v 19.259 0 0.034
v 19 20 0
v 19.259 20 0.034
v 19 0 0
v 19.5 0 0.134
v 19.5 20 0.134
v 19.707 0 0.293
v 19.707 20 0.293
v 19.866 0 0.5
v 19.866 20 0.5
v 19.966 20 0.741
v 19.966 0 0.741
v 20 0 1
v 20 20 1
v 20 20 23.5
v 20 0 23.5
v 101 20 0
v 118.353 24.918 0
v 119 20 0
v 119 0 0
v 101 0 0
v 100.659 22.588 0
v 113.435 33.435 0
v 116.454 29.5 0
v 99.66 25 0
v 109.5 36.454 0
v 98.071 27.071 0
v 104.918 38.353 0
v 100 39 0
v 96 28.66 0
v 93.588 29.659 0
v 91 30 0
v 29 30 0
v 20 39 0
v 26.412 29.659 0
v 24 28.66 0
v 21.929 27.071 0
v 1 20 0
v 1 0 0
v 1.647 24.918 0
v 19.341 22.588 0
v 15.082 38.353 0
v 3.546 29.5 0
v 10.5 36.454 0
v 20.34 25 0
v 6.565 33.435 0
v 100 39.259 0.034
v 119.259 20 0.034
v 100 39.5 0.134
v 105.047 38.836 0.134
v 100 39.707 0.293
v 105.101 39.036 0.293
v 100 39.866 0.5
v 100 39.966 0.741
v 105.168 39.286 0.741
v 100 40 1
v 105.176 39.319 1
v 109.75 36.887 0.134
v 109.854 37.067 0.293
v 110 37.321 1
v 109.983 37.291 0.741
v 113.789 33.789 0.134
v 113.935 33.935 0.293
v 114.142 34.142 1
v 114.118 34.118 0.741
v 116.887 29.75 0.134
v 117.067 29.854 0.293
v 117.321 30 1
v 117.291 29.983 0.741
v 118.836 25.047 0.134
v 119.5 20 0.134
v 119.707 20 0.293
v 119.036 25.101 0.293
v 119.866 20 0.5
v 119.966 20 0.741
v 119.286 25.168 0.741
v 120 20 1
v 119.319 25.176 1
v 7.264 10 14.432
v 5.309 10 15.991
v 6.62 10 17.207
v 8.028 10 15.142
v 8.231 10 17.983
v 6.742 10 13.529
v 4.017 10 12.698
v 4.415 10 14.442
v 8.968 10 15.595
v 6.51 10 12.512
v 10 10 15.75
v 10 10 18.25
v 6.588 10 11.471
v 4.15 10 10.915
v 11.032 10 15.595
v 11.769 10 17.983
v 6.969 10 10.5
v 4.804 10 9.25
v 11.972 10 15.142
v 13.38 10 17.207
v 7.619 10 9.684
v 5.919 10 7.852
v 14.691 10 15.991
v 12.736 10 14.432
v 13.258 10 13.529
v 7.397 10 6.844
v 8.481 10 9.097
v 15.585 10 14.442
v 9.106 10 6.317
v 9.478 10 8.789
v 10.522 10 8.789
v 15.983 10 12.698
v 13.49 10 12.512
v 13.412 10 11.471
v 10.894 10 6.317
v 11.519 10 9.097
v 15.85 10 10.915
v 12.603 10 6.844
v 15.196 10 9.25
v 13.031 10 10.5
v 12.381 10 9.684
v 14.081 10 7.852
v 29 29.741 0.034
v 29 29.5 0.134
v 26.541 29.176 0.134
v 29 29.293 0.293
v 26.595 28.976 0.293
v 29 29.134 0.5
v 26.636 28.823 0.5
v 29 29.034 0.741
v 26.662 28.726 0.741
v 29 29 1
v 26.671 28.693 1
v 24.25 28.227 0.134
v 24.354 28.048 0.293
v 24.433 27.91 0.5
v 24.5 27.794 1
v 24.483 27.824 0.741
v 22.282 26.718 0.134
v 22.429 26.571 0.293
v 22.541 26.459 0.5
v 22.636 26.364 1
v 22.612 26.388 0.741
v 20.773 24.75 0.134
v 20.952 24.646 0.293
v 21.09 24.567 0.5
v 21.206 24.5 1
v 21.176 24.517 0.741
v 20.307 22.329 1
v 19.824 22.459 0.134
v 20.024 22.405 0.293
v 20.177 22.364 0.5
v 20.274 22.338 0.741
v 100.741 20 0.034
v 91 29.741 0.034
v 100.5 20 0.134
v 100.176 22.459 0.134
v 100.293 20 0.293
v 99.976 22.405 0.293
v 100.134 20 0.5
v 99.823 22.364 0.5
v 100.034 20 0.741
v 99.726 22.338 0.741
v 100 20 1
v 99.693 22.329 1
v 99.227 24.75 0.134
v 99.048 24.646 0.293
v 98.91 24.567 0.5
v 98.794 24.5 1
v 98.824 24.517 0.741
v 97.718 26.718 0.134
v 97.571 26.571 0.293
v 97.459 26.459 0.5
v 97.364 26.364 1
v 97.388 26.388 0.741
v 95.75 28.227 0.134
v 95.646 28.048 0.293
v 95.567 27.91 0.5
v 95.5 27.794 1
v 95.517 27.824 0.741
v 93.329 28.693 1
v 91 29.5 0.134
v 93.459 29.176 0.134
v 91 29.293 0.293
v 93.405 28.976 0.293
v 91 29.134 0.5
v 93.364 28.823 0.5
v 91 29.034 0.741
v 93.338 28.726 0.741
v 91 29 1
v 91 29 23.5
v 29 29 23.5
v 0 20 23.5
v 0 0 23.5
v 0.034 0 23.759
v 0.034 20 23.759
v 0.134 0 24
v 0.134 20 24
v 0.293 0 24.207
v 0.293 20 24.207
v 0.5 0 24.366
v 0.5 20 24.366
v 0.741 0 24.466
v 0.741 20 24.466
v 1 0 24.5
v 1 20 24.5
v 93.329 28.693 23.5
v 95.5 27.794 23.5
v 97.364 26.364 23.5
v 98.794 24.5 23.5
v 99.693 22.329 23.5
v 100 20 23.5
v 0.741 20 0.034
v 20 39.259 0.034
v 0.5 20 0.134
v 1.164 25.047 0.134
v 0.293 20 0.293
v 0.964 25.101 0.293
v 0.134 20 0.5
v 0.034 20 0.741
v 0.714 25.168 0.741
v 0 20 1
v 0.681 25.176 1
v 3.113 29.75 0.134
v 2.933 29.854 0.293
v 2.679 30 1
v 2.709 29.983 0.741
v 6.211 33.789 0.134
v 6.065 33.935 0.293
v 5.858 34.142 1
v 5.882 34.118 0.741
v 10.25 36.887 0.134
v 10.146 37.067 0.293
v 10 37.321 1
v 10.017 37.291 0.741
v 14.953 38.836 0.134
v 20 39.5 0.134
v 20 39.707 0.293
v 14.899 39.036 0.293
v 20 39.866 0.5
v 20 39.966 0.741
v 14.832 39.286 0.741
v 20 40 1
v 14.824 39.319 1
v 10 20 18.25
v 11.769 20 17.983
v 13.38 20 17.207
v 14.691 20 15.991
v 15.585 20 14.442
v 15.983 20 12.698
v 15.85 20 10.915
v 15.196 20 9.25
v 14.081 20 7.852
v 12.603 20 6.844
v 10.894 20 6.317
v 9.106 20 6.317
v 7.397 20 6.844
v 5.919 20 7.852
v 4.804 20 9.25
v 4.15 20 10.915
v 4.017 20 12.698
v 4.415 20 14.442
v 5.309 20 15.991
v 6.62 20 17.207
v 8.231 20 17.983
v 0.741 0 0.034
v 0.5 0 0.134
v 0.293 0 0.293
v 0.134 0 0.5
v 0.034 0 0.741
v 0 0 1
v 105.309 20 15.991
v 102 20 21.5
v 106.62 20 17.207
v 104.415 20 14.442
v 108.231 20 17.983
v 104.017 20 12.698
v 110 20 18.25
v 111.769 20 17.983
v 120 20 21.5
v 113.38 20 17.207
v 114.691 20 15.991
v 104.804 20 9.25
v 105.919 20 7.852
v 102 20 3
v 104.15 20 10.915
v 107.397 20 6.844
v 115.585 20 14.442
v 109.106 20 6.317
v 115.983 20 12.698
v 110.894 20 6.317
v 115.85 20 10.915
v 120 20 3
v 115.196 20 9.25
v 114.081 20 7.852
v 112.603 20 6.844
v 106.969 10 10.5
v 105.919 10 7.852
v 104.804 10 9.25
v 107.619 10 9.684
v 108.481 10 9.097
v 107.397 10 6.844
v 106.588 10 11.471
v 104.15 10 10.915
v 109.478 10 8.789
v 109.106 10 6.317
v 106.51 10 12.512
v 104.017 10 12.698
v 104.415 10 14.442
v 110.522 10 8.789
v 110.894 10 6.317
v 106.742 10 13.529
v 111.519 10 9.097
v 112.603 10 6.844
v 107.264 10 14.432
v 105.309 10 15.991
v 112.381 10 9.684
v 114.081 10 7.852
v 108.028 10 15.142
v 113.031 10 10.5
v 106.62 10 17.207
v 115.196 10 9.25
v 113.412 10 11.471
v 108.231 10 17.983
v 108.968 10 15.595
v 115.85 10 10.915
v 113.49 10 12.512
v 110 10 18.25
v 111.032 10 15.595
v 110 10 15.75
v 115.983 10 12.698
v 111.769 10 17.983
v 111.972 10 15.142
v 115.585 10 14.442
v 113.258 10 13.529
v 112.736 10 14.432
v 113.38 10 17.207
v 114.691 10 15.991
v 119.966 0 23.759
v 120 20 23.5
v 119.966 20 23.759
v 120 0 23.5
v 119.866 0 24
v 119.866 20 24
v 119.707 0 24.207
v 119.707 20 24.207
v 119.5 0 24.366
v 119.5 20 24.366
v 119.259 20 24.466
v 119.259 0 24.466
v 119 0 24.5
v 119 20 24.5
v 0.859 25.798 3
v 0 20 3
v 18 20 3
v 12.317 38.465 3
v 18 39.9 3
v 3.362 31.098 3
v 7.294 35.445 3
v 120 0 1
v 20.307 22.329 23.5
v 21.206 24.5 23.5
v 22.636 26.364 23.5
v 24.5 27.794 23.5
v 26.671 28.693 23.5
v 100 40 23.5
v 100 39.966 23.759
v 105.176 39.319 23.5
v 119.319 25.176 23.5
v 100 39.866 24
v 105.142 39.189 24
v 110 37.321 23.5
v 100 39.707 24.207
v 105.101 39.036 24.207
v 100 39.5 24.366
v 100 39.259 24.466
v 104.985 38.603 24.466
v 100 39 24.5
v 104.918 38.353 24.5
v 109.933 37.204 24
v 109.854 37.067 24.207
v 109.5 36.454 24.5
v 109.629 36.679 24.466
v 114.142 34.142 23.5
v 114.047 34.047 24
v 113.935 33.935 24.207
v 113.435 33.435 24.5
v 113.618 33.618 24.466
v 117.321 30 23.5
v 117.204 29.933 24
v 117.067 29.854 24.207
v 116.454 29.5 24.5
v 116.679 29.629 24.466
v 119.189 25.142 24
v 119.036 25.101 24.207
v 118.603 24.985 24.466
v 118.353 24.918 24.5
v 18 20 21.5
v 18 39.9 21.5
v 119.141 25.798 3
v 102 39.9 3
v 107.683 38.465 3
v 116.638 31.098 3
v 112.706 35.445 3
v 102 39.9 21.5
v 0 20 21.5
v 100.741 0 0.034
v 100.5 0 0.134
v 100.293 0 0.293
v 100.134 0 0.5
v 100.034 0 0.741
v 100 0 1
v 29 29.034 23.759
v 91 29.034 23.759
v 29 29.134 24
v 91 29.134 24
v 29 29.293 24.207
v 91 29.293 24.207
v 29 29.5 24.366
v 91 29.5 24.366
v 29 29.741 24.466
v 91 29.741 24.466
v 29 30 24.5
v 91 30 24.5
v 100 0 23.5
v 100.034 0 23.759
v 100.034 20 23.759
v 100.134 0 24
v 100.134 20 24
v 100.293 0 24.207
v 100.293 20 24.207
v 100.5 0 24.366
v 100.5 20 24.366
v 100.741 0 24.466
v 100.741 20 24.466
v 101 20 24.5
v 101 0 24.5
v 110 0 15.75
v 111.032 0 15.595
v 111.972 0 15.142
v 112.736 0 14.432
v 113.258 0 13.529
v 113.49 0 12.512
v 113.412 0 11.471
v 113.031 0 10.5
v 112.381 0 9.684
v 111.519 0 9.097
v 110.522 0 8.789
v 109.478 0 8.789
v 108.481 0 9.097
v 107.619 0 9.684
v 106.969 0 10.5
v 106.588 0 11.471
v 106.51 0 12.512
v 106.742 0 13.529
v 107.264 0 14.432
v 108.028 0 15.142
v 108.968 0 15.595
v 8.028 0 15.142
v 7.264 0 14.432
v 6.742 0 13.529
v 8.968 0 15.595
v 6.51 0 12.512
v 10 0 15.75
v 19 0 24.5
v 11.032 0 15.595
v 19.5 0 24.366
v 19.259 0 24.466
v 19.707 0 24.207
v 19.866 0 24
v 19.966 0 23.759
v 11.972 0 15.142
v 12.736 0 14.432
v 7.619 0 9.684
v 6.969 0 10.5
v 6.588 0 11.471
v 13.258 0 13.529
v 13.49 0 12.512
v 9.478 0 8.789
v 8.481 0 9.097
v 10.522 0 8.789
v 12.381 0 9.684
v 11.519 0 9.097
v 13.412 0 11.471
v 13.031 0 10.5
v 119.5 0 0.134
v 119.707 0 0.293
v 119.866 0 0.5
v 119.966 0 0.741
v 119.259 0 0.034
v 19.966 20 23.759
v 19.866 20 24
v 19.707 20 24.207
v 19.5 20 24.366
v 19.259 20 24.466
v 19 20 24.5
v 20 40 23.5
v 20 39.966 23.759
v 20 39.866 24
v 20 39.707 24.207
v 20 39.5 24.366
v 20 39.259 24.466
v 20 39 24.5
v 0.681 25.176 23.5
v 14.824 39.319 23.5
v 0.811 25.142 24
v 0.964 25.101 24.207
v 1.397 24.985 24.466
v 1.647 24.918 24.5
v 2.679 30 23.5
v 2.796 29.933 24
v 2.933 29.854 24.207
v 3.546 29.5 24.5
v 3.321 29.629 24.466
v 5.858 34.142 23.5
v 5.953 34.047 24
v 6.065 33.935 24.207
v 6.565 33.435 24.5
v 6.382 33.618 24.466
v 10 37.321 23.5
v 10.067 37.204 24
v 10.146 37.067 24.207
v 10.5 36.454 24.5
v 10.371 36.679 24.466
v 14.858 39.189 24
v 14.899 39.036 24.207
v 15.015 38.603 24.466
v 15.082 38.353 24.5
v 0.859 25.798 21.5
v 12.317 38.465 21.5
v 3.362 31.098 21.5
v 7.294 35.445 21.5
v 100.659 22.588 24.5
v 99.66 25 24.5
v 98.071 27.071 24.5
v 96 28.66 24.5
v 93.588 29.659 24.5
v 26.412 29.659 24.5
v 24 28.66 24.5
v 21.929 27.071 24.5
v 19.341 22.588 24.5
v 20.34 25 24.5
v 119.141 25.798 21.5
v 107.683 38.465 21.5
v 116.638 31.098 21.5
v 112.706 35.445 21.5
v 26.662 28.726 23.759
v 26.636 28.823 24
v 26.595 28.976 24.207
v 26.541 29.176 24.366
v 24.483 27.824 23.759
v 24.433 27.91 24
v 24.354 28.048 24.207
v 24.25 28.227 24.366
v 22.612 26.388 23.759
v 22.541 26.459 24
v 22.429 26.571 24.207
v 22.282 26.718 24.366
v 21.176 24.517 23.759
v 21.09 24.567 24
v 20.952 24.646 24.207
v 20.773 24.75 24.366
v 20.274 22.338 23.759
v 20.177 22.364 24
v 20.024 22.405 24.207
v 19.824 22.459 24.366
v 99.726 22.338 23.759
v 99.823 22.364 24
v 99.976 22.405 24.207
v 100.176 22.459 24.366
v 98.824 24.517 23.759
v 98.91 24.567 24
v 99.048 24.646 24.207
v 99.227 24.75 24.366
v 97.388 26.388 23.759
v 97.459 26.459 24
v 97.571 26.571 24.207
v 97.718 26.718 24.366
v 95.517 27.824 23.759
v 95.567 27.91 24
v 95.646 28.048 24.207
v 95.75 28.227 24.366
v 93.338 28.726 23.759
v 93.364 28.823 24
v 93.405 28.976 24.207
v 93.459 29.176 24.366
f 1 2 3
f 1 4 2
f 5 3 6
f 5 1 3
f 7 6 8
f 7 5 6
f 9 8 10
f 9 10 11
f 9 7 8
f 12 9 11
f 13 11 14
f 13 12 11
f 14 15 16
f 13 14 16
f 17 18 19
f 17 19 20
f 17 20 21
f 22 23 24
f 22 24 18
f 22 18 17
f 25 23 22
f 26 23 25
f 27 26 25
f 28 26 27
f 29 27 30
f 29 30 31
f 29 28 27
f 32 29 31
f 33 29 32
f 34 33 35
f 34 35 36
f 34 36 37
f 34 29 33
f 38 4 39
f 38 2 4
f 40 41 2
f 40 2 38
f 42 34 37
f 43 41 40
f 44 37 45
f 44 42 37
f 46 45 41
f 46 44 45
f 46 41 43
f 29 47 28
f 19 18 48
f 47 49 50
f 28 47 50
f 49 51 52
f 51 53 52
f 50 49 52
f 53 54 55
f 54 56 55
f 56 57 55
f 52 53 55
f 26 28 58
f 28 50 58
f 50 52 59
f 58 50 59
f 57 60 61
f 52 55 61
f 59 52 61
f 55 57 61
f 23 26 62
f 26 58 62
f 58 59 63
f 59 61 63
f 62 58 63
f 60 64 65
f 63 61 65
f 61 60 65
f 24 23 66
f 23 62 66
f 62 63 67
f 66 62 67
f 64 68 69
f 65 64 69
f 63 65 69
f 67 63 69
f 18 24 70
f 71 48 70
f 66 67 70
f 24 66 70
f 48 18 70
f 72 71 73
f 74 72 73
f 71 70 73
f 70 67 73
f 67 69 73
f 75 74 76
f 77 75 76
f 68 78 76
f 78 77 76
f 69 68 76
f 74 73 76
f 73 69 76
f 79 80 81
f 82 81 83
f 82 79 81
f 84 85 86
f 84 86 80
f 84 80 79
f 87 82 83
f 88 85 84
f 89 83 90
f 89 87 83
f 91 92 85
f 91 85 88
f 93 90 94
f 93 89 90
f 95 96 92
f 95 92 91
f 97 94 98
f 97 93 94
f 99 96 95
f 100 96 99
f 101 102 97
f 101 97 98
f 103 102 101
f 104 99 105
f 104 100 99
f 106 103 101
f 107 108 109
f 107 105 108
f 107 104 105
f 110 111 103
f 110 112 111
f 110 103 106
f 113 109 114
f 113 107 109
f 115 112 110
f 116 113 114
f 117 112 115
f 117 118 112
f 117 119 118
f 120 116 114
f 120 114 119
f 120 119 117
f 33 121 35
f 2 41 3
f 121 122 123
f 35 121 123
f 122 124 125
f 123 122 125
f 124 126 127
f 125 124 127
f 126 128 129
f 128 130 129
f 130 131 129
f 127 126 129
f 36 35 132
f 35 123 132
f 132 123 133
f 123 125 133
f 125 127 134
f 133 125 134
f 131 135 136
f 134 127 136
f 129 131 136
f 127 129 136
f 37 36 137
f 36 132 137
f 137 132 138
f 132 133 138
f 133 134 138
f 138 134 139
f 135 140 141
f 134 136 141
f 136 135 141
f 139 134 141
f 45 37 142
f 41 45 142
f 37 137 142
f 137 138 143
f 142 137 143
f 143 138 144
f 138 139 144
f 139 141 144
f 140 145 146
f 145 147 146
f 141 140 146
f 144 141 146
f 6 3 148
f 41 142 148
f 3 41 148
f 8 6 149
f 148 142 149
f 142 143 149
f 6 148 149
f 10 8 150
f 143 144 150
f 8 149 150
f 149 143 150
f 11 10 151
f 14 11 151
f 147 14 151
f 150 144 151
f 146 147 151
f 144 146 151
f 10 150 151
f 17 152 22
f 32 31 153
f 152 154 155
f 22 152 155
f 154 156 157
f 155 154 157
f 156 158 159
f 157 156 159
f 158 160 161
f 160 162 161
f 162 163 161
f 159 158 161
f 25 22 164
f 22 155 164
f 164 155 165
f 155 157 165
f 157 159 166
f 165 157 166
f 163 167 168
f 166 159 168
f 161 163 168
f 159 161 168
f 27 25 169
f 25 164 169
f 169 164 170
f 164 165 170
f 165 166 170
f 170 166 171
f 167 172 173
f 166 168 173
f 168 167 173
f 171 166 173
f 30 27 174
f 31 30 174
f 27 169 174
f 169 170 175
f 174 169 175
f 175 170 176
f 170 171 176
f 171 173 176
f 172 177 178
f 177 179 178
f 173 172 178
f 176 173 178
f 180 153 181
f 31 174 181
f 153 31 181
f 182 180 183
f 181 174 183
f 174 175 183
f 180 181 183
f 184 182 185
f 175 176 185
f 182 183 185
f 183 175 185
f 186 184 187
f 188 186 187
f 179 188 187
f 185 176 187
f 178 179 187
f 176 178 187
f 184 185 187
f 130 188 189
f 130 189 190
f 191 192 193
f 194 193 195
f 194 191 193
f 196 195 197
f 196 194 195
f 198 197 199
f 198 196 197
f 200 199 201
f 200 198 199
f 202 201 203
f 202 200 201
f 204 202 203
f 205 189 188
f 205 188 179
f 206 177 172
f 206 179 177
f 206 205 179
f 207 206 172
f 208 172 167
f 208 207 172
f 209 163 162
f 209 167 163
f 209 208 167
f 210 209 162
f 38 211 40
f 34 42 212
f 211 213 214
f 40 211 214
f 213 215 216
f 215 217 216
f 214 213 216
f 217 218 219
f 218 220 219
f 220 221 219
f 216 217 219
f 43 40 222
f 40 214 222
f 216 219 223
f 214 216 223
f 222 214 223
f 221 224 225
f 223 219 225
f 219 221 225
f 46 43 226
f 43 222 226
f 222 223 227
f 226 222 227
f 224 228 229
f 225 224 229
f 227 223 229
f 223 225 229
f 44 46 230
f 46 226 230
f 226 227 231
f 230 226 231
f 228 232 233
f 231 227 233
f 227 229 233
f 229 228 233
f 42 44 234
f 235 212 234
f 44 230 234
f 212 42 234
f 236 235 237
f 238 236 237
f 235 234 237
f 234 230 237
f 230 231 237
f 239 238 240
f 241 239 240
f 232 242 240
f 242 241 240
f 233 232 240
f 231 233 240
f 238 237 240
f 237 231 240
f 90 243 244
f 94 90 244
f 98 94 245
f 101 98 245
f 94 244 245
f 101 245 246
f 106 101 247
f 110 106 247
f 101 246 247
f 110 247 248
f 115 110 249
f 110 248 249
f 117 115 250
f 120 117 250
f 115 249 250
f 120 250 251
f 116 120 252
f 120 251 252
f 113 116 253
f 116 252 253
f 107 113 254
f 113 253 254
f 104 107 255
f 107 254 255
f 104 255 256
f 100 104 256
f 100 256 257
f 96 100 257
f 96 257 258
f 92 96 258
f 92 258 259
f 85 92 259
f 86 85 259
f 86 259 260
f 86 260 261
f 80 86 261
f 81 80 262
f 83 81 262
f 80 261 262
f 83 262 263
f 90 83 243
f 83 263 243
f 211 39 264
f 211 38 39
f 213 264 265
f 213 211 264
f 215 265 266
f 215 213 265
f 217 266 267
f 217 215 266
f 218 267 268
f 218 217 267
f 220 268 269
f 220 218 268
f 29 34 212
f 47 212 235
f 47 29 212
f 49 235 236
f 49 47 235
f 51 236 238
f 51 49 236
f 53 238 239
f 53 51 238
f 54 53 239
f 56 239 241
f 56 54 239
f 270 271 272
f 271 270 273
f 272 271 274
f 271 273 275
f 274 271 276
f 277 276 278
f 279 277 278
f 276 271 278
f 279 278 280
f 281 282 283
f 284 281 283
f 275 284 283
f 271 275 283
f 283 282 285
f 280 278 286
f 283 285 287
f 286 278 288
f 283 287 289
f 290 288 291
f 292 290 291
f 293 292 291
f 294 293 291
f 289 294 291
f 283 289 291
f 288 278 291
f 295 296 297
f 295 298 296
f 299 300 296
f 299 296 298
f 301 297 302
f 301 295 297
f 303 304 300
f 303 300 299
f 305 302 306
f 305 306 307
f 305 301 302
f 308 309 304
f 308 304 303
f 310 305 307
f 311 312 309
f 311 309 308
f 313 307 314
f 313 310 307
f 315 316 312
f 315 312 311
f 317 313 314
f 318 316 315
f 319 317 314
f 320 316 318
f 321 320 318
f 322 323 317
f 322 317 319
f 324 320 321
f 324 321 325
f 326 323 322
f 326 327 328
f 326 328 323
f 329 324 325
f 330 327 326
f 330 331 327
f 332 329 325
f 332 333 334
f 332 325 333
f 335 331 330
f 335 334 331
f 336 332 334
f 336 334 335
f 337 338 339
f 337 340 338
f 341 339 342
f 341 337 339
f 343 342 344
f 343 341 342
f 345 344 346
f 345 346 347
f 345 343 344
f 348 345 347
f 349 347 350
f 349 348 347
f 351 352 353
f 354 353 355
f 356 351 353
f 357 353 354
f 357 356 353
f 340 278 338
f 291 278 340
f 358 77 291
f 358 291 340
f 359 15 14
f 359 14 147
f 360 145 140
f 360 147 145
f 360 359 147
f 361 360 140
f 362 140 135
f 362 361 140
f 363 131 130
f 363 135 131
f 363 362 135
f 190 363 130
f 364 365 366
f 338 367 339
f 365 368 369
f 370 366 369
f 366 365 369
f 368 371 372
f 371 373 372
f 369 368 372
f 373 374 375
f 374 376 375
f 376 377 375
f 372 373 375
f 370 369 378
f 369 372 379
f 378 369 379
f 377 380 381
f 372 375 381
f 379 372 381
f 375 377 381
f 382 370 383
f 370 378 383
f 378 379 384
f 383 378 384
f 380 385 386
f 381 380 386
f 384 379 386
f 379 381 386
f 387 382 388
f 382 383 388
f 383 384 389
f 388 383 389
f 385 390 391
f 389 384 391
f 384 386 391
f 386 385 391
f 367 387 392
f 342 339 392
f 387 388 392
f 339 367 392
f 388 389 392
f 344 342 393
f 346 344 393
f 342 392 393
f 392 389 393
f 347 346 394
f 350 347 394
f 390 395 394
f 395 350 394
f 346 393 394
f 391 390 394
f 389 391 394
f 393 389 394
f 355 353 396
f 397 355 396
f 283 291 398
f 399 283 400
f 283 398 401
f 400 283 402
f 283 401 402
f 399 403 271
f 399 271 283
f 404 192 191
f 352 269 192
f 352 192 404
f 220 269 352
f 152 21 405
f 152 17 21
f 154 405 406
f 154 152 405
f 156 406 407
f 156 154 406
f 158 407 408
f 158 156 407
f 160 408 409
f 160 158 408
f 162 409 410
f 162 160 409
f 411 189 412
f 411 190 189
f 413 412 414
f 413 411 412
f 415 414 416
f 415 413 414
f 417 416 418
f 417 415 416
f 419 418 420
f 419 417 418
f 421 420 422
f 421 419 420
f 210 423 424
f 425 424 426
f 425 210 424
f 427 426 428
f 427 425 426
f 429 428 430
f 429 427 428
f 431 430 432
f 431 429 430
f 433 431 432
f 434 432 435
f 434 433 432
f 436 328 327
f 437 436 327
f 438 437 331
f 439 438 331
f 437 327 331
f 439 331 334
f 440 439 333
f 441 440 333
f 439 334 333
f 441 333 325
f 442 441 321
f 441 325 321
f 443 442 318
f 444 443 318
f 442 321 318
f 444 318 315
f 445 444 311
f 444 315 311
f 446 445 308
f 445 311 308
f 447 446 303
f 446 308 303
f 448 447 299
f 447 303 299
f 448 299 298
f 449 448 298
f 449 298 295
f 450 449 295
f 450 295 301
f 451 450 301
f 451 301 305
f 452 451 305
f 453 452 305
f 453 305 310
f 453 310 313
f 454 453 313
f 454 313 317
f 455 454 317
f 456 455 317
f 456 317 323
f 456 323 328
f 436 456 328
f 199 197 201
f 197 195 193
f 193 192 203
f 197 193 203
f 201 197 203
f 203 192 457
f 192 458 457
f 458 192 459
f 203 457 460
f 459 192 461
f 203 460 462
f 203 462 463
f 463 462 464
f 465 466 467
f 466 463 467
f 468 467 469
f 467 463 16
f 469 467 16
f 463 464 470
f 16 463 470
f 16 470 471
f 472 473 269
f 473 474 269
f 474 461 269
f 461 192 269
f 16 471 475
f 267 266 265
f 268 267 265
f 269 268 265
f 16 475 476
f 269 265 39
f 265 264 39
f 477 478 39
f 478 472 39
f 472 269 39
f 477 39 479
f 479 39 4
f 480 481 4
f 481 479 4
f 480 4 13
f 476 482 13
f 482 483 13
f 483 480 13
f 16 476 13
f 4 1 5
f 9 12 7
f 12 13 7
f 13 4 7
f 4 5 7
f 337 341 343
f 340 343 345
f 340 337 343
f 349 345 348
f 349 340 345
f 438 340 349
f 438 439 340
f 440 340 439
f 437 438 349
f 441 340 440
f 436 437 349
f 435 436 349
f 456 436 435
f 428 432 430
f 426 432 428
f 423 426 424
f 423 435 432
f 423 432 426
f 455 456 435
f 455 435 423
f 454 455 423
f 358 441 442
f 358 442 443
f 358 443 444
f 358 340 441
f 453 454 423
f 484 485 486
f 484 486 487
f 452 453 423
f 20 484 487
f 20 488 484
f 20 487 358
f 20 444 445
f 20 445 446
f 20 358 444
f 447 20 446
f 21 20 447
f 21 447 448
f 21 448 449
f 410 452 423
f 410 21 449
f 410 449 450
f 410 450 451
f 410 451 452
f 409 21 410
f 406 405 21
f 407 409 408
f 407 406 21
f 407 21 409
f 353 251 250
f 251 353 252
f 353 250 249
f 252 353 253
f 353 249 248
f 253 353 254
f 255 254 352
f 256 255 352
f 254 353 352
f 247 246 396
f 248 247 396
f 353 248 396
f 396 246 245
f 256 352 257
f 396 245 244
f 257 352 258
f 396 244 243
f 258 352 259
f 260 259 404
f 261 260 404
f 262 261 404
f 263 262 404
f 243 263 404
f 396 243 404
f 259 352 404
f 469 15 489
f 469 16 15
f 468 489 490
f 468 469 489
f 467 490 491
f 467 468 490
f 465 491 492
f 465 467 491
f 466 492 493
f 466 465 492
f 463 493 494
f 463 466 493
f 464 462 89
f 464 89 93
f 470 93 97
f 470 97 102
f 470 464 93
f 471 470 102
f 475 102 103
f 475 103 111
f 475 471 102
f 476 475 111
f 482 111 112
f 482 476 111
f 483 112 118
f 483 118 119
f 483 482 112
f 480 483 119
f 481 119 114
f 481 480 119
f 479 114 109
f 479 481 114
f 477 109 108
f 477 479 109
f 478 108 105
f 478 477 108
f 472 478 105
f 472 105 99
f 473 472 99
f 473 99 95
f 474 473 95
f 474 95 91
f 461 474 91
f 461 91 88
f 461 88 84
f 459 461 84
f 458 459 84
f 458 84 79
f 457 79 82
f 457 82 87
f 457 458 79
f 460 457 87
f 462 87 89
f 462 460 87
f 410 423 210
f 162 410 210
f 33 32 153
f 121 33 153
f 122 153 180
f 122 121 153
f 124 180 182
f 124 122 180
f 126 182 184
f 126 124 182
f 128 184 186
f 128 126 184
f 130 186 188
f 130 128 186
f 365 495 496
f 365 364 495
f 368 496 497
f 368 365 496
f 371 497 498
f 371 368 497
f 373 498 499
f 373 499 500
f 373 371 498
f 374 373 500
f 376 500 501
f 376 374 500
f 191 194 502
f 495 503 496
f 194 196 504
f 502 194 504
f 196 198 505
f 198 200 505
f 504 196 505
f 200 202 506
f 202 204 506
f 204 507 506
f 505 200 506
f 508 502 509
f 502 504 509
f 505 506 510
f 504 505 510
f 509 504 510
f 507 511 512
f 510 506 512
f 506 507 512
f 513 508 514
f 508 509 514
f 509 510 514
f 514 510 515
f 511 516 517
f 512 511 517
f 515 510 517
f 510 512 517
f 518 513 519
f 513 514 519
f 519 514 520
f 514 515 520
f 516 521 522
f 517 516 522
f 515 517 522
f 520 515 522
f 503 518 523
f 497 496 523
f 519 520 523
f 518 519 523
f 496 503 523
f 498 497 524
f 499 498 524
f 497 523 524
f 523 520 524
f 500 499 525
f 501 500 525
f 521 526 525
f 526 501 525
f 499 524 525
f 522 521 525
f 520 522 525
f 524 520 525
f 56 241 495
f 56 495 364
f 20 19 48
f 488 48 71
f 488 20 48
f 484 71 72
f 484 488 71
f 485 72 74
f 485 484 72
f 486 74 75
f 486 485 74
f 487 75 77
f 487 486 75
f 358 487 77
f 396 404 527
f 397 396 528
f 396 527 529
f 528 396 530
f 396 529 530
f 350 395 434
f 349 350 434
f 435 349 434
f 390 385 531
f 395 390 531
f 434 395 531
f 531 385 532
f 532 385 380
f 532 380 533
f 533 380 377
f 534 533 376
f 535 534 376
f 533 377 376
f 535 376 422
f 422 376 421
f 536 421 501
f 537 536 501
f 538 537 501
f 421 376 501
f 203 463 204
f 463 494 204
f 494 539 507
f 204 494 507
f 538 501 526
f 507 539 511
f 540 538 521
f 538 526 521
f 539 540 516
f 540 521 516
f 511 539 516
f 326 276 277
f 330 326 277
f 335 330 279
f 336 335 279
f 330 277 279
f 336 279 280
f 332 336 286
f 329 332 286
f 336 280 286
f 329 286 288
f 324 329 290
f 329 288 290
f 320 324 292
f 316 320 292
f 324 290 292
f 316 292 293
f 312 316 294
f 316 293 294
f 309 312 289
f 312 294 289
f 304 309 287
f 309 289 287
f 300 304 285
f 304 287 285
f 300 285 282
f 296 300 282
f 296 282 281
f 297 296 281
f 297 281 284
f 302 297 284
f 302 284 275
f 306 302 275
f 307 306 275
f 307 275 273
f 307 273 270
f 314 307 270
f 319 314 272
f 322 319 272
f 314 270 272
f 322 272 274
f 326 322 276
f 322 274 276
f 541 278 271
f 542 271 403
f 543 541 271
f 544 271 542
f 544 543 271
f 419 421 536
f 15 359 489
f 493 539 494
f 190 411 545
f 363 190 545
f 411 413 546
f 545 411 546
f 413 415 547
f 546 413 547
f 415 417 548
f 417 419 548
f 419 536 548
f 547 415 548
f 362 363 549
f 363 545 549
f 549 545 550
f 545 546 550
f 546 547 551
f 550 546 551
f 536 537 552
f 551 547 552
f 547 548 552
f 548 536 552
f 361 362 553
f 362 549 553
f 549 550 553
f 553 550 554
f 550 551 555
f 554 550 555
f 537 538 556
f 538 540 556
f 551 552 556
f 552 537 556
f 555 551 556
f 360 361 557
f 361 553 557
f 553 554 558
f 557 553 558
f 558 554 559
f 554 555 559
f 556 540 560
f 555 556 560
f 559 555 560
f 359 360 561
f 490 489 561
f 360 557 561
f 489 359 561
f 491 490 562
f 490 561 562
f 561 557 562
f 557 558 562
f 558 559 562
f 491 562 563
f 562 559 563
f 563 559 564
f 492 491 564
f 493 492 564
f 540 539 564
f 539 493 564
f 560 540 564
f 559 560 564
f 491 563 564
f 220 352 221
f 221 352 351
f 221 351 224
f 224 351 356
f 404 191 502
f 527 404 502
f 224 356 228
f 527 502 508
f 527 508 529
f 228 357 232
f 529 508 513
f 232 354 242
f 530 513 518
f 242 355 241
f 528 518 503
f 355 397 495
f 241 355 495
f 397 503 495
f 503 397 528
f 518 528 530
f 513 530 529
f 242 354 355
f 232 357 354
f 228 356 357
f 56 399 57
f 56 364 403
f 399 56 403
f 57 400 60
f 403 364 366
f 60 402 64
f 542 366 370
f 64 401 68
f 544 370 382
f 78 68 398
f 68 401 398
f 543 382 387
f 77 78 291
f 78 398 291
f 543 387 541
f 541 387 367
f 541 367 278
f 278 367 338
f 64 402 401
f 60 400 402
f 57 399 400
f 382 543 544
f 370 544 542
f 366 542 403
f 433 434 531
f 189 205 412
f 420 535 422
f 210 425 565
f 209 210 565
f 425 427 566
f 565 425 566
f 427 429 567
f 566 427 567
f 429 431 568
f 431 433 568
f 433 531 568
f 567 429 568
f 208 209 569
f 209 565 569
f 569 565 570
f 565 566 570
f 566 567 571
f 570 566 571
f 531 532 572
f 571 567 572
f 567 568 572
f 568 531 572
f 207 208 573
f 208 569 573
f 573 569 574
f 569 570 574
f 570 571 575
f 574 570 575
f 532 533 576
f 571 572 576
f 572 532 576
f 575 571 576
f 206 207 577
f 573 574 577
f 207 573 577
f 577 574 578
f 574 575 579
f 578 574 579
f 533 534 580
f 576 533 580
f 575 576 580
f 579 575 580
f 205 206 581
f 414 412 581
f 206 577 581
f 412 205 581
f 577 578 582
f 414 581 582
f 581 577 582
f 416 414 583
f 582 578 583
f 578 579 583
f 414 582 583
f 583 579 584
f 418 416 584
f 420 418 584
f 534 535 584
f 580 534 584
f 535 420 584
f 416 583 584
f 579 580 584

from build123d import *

# Parameters (mm, degrees)
EXTRUDE_1_DEPTH     = 24.5
FILLET_1_R          = 20
FILLET_2_R          = 9
SKETCH_2_W          = 18.5
SKETCH_2_H          = 26.060105981
CUT_EXTRUDE_1_DEPTH = 18
SKETCH_3_W          = 18.5
SKETCH_3_H          = 21.487076152
CUT_EXTRUDE_2_DEPTH = 18
FILLET_3_R          = 1
SKETCH_6_R          = 4
SKETCH_6_R_2        = 3.25
CUT_EXTRUDE_3_DEPTH = 129.841957452
SKETCH_7_R          = 6
CUT_EXTRUDE_4_DEPTH = 10
SKETCH_8_R          = 3.5
CUT_EXTRUDE_5_DEPTH = 127.09619344
EXTRUDE_START       = -10
SKETCH_9_R          = 4
SKETCH_9_R_2        = 3.5
EXTRUDE_2_DEPTH     = 10


with BuildPart() as part:
    # Эскиз1 → Бобышка-Вытянуть1 (new body)
    with BuildSketch(Plane.XY):
        Polygon((0, 0), (0, 40), (120, 40), (120, 0), (100, 0), (100, 29), (20, 29), (20, 0), align=None)
    extrude(amount=EXTRUDE_1_DEPTH)

    # Скругление1
    fillet_1_edges = [part.edges().sort_by_distance(p)[0] for p in [
        (0, 40, 12.25),
        (120, 40, 12.25),
    ]]
    fillet(fillet_1_edges, radius=FILLET_1_R)

    # Скругление2
    fillet_2_edges = [part.edges().sort_by_distance(p)[0] for p in [
        (100, 29, 12.25),
        (20, 29, 12.25),
    ]]
    fillet(fillet_2_edges, radius=FILLET_2_R)

    # Эскиз2 → Вырез-Вытянуть1 (cut)
    with BuildSketch(Plane(origin=(120, 0, 0), x_dir=(0, 0, -1), z_dir=(1, 0, 0))):
        with Locations((-12.25, 33.03005299)):
            Rectangle(SKETCH_2_W, SKETCH_2_H)
    extrude(amount=-CUT_EXTRUDE_1_DEPTH, mode=Mode.SUBTRACT)

    # Эскиз3 → Вырез-Вытянуть2 (cut)
    with BuildSketch(Plane.ZY):
        with Locations((12.25, 30.743538076)):
            Rectangle(SKETCH_3_W, SKETCH_3_H)
    extrude(amount=-CUT_EXTRUDE_2_DEPTH, mode=Mode.SUBTRACT)

    # Скругление3
    fillet_3_edges = [part.edges().sort_by_distance(p)[0] for p in [
        (20, 10, 0),
        (120, 10, 24.5),
        (0, 10, 0),
        (0, 10, 24.5),
        (60, 40, 0),
        (114.142135624, 34.142135624, 0),
        (5.857864376, 34.142135624, 0),
        (60, 40, 24.5),
        (114.142135624, 34.142135624, 24.5),
        (5.857864376, 34.142135624, 24.5),
        (60, 29, 0),
        (60, 29, 24.5),
        (100, 10, 0),
        (100, 10, 24.5),
        (22.636038969, 26.363961031, 0),
        (22.636038969, 26.363961031, 24.5),
        (97.363961031, 26.363961031, 0),
        (97.363961031, 26.363961031, 24.5),
        (20, 10, 24.5),
        (120, 10, 0),
    ]]
    fillet(fillet_3_edges, radius=FILLET_3_R)

    # Эскиз6 → Вырез-Вытянуть3 (cut, through all)
    with BuildSketch(Plane(origin=(0, 0, 0), x_dir=(-1, 0, 0), z_dir=(0, -1, 0))):
        with Locations(Location((-10, -12.25, 0), (0, 0, 180))):
            Circle(SKETCH_6_R)
        with Locations(Location((-110, -12.25, 0), (0, 0, 180))):
            Circle(SKETCH_6_R_2)
    extrude(amount=-CUT_EXTRUDE_3_DEPTH, mode=Mode.SUBTRACT)

    # Эскиз7 → Вырез-Вытянуть4 (cut)
    with BuildSketch(Plane(origin=(0, 20, 0), x_dir=(1, 0, 0), z_dir=(0, 1, 0))):
        with Locations(Location((10, -12.25, 0), (0, 0, 270))):
            Circle(SKETCH_7_R)
        with Locations(Location((110, -12.25, 0), (0, 0, 270))):
            Circle(SKETCH_7_R)
    extrude(amount=-CUT_EXTRUDE_4_DEPTH, mode=Mode.SUBTRACT)

    # Эскиз8 → Вырез-Вытянуть5 (cut, through all)
    with BuildSketch(Plane(origin=(0, 10, 0), x_dir=(1, 0, 0), z_dir=(0, 1, 0))):
        with Locations(Location((110, -12.25, 0), (0, 0, 270))):
            Circle(SKETCH_8_R)
    extrude(amount=-CUT_EXTRUDE_5_DEPTH, mode=Mode.SUBTRACT)

    # Эскиз9 → Бобышка-Вытянуть2 (add)
    with BuildSketch(Plane(origin=(0, 10, 0), x_dir=(1, 0, 0), z_dir=(0, 1, 0)).offset(EXTRUDE_START)):
        with Locations((10, -12.25)):
            Circle(SKETCH_9_R)
        with Locations(Location((10, -12.25, 0), (0, 0, 270))):
            Circle(SKETCH_9_R_2, mode=Mode.SUBTRACT)
    extrude(amount=EXTRUDE_2_DEPTH)


solid = part.part
